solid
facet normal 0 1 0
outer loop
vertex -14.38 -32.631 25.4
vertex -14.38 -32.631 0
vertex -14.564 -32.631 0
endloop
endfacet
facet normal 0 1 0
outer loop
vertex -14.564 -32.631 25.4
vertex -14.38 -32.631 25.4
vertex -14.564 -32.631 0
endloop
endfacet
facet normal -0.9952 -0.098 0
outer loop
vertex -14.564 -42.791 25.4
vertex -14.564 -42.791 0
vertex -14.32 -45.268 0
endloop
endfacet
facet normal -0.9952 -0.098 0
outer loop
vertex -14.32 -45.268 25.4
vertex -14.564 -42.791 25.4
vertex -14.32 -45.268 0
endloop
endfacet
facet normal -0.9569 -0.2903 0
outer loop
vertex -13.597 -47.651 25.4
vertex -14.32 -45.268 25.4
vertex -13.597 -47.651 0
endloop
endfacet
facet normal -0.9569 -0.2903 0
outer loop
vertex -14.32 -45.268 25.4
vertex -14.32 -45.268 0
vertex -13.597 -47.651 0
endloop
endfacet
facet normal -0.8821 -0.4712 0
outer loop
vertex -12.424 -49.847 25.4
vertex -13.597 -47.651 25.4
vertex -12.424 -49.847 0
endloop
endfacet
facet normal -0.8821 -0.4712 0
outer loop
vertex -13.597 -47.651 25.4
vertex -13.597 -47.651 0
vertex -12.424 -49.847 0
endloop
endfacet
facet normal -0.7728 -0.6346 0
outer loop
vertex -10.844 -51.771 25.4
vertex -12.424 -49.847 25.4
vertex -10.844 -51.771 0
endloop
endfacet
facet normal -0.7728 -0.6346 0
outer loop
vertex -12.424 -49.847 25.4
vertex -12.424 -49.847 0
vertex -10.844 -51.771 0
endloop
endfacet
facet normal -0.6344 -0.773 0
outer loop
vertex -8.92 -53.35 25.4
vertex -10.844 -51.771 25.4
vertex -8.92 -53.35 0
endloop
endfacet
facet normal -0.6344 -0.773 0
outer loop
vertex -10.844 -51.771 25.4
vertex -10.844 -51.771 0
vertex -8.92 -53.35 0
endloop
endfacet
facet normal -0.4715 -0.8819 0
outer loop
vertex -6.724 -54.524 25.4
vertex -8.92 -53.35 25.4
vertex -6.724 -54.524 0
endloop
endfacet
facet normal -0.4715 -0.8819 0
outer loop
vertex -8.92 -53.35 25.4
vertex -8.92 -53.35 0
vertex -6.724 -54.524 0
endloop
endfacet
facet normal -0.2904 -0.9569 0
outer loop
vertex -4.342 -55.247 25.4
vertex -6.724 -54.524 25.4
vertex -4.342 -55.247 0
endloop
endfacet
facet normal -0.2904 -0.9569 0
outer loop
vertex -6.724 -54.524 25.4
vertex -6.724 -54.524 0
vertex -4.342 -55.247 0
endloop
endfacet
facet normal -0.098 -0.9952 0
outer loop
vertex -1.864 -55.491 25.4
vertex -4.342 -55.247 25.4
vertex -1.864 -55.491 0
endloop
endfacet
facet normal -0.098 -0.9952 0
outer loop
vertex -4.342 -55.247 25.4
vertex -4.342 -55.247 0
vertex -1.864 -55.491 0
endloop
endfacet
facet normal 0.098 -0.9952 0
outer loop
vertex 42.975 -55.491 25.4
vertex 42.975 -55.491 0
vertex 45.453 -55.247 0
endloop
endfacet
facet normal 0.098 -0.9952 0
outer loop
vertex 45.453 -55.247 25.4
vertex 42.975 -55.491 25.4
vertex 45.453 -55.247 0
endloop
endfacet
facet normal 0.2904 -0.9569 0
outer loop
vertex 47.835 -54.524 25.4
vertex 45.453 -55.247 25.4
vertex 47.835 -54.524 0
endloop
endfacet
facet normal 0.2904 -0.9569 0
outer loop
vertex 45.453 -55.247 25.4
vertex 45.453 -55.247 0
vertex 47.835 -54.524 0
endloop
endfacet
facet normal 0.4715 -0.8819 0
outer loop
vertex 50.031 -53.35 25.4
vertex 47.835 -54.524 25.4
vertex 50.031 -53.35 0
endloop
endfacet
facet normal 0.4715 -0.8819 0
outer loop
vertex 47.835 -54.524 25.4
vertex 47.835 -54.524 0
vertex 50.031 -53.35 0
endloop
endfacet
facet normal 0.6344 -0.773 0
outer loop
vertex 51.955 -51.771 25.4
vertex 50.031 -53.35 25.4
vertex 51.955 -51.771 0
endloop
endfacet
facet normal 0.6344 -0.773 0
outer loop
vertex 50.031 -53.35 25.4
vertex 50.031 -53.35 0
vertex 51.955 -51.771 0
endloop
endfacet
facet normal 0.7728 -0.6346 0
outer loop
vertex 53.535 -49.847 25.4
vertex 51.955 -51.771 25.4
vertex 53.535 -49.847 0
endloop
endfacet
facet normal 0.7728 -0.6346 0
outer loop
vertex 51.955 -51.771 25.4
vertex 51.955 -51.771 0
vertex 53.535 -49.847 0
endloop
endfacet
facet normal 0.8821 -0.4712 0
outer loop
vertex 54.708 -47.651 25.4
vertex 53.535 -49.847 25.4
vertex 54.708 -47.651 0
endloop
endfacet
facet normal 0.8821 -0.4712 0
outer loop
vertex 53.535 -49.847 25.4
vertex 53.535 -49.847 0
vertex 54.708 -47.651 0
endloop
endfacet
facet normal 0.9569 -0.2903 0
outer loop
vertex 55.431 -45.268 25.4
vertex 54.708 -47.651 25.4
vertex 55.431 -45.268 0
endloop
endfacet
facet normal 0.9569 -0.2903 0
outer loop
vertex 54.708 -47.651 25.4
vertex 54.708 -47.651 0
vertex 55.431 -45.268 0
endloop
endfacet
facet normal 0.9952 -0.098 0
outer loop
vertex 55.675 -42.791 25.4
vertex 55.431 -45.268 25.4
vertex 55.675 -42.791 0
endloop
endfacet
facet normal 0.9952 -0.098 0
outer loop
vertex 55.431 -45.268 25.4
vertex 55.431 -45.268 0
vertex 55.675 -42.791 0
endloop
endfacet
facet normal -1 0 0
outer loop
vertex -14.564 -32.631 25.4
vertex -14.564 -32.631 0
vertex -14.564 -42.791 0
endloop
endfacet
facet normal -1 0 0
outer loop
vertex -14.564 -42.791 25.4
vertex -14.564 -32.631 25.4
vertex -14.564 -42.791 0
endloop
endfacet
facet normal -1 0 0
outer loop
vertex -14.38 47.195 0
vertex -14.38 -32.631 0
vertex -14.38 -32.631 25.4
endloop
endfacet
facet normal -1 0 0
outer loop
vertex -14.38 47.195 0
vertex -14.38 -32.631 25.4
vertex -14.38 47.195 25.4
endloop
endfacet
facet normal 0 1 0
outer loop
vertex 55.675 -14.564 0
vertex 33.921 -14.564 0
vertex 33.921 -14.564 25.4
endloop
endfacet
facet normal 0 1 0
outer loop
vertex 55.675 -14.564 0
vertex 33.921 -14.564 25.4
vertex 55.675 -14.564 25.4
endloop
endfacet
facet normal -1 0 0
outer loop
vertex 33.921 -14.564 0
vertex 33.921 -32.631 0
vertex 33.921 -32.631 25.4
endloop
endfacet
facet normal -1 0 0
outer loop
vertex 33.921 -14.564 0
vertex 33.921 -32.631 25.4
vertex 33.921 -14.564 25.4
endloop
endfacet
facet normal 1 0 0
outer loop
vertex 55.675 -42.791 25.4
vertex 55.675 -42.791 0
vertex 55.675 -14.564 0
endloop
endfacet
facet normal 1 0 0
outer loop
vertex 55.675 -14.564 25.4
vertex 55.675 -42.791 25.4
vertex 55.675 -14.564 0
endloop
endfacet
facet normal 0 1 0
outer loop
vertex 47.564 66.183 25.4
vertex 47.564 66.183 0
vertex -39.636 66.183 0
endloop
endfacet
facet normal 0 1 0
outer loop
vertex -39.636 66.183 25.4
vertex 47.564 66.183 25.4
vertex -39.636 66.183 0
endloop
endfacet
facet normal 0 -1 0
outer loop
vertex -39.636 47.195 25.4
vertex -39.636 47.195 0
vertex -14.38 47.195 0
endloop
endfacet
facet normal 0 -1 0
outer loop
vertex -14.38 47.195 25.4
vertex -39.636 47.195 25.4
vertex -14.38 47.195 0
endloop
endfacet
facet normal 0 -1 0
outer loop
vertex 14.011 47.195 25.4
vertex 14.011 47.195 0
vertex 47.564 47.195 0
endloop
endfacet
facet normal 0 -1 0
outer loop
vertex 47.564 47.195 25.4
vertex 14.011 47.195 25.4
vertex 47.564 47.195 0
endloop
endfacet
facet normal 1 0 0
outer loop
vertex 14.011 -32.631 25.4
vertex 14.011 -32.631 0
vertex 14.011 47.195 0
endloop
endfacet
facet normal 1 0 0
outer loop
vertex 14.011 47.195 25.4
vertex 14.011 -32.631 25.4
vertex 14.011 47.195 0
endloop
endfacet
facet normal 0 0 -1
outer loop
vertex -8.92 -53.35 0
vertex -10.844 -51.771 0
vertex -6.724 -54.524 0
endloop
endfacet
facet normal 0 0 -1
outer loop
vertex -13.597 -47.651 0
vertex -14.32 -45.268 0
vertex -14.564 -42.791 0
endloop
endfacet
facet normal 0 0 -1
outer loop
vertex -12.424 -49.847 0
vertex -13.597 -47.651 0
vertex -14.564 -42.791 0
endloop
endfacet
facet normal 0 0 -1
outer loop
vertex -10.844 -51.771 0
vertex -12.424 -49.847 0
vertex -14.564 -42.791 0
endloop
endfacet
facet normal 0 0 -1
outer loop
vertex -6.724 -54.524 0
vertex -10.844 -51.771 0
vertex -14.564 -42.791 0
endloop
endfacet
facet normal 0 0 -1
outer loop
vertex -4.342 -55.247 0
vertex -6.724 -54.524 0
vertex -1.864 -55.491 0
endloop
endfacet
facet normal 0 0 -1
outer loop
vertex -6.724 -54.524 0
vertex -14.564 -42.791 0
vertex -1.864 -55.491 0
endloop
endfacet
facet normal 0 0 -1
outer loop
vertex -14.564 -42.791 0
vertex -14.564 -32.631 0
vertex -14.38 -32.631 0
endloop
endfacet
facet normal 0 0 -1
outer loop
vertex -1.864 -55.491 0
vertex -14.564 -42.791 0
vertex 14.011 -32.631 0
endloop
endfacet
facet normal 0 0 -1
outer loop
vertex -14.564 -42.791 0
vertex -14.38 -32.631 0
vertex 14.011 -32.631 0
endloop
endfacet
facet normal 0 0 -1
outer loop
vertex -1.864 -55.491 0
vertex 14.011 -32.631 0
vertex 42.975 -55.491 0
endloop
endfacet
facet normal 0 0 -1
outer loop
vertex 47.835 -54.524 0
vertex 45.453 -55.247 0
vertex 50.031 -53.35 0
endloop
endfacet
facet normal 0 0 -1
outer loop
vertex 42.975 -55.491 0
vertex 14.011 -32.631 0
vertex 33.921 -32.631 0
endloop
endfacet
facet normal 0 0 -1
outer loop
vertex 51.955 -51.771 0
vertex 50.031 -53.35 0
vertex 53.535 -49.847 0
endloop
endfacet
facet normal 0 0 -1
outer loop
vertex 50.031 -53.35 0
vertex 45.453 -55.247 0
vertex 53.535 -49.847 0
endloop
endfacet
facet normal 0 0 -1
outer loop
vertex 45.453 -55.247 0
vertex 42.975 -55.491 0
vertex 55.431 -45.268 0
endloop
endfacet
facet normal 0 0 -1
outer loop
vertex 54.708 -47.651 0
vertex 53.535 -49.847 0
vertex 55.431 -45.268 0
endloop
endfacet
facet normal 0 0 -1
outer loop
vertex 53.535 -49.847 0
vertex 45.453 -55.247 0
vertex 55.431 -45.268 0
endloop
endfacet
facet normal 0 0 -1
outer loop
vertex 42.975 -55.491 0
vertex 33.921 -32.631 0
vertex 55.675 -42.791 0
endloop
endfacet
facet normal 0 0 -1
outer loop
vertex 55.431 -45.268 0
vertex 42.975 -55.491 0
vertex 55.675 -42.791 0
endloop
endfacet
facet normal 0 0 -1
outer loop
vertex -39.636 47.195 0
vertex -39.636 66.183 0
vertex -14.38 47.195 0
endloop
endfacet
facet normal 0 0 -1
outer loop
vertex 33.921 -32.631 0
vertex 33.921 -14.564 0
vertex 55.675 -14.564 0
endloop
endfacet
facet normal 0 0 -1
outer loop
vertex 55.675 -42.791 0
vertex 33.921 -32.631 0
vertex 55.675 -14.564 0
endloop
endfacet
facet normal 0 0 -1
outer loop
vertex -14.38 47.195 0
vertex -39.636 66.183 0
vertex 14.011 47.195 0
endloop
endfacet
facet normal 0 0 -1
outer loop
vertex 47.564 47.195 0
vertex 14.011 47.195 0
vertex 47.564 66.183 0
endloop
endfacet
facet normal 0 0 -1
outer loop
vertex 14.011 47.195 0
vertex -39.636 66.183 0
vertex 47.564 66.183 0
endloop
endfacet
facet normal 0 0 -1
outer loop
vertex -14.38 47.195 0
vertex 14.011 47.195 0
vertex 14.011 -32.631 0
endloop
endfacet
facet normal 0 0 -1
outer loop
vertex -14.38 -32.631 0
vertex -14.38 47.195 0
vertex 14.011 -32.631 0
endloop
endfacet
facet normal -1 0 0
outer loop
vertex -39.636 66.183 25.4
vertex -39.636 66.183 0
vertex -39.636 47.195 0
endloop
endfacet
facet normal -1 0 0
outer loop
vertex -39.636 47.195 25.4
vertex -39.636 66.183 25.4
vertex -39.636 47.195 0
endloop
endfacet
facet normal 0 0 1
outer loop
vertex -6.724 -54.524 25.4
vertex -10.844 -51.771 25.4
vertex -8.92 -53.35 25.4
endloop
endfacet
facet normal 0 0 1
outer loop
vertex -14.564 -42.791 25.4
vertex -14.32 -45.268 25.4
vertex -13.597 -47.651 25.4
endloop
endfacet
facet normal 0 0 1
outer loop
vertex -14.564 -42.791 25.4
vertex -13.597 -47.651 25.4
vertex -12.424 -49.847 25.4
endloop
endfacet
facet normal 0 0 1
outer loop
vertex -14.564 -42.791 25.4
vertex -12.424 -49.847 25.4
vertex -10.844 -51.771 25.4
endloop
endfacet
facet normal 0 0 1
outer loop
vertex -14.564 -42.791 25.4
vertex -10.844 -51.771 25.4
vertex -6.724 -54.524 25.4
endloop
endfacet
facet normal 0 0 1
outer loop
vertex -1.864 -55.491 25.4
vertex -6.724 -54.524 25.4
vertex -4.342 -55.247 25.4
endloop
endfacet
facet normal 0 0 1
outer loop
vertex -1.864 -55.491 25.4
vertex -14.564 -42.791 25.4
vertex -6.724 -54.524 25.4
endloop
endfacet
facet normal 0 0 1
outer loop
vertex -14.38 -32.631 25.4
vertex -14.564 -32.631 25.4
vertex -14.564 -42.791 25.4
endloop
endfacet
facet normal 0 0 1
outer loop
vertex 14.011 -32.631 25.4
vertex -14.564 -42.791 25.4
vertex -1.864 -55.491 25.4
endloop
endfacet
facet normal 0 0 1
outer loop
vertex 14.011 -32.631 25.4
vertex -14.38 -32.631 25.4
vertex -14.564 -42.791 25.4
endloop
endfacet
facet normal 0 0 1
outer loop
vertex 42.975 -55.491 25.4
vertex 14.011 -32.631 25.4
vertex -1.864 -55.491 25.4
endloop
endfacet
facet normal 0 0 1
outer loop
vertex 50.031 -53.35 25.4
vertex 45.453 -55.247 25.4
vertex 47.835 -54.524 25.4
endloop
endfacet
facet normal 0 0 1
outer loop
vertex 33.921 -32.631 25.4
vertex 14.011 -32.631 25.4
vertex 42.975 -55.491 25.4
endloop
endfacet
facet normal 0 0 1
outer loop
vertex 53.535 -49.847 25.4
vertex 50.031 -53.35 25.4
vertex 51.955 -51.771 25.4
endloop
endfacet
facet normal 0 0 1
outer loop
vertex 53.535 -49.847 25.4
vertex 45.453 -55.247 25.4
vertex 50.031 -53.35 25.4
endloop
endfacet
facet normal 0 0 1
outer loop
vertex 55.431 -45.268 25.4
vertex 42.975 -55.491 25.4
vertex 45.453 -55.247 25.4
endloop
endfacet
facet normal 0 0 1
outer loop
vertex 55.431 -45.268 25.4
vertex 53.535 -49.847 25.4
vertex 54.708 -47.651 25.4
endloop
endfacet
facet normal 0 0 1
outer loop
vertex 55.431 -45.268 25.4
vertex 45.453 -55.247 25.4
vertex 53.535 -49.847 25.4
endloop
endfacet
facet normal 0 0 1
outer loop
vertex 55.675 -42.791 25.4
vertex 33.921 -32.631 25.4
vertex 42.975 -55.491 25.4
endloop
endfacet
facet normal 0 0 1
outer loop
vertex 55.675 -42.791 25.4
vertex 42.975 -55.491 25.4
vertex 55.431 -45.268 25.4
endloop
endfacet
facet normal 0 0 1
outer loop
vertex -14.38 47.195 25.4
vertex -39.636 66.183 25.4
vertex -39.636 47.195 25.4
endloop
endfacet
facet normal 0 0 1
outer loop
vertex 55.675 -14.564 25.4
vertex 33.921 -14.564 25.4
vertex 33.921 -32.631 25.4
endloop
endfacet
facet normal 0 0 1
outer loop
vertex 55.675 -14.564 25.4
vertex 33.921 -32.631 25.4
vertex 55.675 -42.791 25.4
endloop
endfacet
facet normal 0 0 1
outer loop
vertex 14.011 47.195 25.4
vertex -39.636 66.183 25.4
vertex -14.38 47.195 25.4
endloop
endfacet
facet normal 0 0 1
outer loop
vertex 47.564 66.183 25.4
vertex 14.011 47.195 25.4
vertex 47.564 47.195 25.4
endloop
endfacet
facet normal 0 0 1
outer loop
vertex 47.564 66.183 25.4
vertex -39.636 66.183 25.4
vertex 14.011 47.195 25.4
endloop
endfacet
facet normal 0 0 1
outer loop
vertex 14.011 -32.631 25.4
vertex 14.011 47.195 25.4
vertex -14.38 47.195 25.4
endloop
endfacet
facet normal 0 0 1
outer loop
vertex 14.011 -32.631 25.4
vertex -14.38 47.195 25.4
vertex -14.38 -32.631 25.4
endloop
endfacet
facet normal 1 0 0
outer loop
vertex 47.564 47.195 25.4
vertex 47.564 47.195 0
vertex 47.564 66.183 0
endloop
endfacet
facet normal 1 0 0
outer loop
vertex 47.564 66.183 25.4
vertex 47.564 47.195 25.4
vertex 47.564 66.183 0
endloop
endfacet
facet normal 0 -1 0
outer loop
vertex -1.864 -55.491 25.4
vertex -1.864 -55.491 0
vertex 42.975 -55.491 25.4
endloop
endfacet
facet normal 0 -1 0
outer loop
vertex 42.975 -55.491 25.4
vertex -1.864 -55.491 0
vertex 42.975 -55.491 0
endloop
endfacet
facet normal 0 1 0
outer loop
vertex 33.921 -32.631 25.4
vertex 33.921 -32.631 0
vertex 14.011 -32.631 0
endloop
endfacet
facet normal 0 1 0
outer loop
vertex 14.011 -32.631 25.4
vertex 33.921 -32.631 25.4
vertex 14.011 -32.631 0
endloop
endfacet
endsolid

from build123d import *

# Parameters (mm, degrees)
F0_W     = 28.390645
F0_H     = 79.825648
F0_W_2   = 21.75387
F0_H_2   = 18.066776
F1_DEPTH = 25.4


with BuildPart() as f1:
    # F0 (on Top) → F1 (new body)
    with BuildSketch(Plane.XY):
        Polygon((-39.636292, 47.194839), (-14.379677, 47.194839), (14.010968, 47.194839), (47.563549, 47.194839), (47.563549, 66.183388), (-39.636292, 66.183388), align=None)
        with Locations((-0.184354, 7.282015)):
            Rectangle(F0_W, F0_H)
        with BuildLine():
            Line((14.010968, -32.630809), (-14.379677, -32.630809))
            Line((-14.379677, -32.630809), (-14.564033, -32.630809))
            Line((-14.564033, -32.630809), (-14.564033, -42.790807))
            ThreePointArc((-14.564033, -42.790807), (-10.844289, -51.771063), (-1.864033, -55.490807))
            Line((-1.864033, -55.490807), (14.010968, -55.490807))
            Line((14.010968, -55.490807), (14.010968, -32.630809))
        make_face()
        with BuildLine():
            Line((33.92129, -32.630809), (14.010968, -32.630809))
            Line((14.010968, -32.630809), (14.010968, -55.490807))
            Line((14.010968, -55.490807), (42.97516, -55.490807))
            ThreePointArc((42.97516, -55.490807), (51.955416, -51.771063), (55.67516, -42.790807))
            Line((55.67516, -42.790807), (55.67516, -32.630809))
            Line((55.67516, -32.630809), (33.92129, -32.630809))
        make_face()
        with Locations((44.798225, -23.597421)):
            Rectangle(F0_W_2, F0_H_2)
    extrude(amount=F1_DEPTH)


solid = f1.part
